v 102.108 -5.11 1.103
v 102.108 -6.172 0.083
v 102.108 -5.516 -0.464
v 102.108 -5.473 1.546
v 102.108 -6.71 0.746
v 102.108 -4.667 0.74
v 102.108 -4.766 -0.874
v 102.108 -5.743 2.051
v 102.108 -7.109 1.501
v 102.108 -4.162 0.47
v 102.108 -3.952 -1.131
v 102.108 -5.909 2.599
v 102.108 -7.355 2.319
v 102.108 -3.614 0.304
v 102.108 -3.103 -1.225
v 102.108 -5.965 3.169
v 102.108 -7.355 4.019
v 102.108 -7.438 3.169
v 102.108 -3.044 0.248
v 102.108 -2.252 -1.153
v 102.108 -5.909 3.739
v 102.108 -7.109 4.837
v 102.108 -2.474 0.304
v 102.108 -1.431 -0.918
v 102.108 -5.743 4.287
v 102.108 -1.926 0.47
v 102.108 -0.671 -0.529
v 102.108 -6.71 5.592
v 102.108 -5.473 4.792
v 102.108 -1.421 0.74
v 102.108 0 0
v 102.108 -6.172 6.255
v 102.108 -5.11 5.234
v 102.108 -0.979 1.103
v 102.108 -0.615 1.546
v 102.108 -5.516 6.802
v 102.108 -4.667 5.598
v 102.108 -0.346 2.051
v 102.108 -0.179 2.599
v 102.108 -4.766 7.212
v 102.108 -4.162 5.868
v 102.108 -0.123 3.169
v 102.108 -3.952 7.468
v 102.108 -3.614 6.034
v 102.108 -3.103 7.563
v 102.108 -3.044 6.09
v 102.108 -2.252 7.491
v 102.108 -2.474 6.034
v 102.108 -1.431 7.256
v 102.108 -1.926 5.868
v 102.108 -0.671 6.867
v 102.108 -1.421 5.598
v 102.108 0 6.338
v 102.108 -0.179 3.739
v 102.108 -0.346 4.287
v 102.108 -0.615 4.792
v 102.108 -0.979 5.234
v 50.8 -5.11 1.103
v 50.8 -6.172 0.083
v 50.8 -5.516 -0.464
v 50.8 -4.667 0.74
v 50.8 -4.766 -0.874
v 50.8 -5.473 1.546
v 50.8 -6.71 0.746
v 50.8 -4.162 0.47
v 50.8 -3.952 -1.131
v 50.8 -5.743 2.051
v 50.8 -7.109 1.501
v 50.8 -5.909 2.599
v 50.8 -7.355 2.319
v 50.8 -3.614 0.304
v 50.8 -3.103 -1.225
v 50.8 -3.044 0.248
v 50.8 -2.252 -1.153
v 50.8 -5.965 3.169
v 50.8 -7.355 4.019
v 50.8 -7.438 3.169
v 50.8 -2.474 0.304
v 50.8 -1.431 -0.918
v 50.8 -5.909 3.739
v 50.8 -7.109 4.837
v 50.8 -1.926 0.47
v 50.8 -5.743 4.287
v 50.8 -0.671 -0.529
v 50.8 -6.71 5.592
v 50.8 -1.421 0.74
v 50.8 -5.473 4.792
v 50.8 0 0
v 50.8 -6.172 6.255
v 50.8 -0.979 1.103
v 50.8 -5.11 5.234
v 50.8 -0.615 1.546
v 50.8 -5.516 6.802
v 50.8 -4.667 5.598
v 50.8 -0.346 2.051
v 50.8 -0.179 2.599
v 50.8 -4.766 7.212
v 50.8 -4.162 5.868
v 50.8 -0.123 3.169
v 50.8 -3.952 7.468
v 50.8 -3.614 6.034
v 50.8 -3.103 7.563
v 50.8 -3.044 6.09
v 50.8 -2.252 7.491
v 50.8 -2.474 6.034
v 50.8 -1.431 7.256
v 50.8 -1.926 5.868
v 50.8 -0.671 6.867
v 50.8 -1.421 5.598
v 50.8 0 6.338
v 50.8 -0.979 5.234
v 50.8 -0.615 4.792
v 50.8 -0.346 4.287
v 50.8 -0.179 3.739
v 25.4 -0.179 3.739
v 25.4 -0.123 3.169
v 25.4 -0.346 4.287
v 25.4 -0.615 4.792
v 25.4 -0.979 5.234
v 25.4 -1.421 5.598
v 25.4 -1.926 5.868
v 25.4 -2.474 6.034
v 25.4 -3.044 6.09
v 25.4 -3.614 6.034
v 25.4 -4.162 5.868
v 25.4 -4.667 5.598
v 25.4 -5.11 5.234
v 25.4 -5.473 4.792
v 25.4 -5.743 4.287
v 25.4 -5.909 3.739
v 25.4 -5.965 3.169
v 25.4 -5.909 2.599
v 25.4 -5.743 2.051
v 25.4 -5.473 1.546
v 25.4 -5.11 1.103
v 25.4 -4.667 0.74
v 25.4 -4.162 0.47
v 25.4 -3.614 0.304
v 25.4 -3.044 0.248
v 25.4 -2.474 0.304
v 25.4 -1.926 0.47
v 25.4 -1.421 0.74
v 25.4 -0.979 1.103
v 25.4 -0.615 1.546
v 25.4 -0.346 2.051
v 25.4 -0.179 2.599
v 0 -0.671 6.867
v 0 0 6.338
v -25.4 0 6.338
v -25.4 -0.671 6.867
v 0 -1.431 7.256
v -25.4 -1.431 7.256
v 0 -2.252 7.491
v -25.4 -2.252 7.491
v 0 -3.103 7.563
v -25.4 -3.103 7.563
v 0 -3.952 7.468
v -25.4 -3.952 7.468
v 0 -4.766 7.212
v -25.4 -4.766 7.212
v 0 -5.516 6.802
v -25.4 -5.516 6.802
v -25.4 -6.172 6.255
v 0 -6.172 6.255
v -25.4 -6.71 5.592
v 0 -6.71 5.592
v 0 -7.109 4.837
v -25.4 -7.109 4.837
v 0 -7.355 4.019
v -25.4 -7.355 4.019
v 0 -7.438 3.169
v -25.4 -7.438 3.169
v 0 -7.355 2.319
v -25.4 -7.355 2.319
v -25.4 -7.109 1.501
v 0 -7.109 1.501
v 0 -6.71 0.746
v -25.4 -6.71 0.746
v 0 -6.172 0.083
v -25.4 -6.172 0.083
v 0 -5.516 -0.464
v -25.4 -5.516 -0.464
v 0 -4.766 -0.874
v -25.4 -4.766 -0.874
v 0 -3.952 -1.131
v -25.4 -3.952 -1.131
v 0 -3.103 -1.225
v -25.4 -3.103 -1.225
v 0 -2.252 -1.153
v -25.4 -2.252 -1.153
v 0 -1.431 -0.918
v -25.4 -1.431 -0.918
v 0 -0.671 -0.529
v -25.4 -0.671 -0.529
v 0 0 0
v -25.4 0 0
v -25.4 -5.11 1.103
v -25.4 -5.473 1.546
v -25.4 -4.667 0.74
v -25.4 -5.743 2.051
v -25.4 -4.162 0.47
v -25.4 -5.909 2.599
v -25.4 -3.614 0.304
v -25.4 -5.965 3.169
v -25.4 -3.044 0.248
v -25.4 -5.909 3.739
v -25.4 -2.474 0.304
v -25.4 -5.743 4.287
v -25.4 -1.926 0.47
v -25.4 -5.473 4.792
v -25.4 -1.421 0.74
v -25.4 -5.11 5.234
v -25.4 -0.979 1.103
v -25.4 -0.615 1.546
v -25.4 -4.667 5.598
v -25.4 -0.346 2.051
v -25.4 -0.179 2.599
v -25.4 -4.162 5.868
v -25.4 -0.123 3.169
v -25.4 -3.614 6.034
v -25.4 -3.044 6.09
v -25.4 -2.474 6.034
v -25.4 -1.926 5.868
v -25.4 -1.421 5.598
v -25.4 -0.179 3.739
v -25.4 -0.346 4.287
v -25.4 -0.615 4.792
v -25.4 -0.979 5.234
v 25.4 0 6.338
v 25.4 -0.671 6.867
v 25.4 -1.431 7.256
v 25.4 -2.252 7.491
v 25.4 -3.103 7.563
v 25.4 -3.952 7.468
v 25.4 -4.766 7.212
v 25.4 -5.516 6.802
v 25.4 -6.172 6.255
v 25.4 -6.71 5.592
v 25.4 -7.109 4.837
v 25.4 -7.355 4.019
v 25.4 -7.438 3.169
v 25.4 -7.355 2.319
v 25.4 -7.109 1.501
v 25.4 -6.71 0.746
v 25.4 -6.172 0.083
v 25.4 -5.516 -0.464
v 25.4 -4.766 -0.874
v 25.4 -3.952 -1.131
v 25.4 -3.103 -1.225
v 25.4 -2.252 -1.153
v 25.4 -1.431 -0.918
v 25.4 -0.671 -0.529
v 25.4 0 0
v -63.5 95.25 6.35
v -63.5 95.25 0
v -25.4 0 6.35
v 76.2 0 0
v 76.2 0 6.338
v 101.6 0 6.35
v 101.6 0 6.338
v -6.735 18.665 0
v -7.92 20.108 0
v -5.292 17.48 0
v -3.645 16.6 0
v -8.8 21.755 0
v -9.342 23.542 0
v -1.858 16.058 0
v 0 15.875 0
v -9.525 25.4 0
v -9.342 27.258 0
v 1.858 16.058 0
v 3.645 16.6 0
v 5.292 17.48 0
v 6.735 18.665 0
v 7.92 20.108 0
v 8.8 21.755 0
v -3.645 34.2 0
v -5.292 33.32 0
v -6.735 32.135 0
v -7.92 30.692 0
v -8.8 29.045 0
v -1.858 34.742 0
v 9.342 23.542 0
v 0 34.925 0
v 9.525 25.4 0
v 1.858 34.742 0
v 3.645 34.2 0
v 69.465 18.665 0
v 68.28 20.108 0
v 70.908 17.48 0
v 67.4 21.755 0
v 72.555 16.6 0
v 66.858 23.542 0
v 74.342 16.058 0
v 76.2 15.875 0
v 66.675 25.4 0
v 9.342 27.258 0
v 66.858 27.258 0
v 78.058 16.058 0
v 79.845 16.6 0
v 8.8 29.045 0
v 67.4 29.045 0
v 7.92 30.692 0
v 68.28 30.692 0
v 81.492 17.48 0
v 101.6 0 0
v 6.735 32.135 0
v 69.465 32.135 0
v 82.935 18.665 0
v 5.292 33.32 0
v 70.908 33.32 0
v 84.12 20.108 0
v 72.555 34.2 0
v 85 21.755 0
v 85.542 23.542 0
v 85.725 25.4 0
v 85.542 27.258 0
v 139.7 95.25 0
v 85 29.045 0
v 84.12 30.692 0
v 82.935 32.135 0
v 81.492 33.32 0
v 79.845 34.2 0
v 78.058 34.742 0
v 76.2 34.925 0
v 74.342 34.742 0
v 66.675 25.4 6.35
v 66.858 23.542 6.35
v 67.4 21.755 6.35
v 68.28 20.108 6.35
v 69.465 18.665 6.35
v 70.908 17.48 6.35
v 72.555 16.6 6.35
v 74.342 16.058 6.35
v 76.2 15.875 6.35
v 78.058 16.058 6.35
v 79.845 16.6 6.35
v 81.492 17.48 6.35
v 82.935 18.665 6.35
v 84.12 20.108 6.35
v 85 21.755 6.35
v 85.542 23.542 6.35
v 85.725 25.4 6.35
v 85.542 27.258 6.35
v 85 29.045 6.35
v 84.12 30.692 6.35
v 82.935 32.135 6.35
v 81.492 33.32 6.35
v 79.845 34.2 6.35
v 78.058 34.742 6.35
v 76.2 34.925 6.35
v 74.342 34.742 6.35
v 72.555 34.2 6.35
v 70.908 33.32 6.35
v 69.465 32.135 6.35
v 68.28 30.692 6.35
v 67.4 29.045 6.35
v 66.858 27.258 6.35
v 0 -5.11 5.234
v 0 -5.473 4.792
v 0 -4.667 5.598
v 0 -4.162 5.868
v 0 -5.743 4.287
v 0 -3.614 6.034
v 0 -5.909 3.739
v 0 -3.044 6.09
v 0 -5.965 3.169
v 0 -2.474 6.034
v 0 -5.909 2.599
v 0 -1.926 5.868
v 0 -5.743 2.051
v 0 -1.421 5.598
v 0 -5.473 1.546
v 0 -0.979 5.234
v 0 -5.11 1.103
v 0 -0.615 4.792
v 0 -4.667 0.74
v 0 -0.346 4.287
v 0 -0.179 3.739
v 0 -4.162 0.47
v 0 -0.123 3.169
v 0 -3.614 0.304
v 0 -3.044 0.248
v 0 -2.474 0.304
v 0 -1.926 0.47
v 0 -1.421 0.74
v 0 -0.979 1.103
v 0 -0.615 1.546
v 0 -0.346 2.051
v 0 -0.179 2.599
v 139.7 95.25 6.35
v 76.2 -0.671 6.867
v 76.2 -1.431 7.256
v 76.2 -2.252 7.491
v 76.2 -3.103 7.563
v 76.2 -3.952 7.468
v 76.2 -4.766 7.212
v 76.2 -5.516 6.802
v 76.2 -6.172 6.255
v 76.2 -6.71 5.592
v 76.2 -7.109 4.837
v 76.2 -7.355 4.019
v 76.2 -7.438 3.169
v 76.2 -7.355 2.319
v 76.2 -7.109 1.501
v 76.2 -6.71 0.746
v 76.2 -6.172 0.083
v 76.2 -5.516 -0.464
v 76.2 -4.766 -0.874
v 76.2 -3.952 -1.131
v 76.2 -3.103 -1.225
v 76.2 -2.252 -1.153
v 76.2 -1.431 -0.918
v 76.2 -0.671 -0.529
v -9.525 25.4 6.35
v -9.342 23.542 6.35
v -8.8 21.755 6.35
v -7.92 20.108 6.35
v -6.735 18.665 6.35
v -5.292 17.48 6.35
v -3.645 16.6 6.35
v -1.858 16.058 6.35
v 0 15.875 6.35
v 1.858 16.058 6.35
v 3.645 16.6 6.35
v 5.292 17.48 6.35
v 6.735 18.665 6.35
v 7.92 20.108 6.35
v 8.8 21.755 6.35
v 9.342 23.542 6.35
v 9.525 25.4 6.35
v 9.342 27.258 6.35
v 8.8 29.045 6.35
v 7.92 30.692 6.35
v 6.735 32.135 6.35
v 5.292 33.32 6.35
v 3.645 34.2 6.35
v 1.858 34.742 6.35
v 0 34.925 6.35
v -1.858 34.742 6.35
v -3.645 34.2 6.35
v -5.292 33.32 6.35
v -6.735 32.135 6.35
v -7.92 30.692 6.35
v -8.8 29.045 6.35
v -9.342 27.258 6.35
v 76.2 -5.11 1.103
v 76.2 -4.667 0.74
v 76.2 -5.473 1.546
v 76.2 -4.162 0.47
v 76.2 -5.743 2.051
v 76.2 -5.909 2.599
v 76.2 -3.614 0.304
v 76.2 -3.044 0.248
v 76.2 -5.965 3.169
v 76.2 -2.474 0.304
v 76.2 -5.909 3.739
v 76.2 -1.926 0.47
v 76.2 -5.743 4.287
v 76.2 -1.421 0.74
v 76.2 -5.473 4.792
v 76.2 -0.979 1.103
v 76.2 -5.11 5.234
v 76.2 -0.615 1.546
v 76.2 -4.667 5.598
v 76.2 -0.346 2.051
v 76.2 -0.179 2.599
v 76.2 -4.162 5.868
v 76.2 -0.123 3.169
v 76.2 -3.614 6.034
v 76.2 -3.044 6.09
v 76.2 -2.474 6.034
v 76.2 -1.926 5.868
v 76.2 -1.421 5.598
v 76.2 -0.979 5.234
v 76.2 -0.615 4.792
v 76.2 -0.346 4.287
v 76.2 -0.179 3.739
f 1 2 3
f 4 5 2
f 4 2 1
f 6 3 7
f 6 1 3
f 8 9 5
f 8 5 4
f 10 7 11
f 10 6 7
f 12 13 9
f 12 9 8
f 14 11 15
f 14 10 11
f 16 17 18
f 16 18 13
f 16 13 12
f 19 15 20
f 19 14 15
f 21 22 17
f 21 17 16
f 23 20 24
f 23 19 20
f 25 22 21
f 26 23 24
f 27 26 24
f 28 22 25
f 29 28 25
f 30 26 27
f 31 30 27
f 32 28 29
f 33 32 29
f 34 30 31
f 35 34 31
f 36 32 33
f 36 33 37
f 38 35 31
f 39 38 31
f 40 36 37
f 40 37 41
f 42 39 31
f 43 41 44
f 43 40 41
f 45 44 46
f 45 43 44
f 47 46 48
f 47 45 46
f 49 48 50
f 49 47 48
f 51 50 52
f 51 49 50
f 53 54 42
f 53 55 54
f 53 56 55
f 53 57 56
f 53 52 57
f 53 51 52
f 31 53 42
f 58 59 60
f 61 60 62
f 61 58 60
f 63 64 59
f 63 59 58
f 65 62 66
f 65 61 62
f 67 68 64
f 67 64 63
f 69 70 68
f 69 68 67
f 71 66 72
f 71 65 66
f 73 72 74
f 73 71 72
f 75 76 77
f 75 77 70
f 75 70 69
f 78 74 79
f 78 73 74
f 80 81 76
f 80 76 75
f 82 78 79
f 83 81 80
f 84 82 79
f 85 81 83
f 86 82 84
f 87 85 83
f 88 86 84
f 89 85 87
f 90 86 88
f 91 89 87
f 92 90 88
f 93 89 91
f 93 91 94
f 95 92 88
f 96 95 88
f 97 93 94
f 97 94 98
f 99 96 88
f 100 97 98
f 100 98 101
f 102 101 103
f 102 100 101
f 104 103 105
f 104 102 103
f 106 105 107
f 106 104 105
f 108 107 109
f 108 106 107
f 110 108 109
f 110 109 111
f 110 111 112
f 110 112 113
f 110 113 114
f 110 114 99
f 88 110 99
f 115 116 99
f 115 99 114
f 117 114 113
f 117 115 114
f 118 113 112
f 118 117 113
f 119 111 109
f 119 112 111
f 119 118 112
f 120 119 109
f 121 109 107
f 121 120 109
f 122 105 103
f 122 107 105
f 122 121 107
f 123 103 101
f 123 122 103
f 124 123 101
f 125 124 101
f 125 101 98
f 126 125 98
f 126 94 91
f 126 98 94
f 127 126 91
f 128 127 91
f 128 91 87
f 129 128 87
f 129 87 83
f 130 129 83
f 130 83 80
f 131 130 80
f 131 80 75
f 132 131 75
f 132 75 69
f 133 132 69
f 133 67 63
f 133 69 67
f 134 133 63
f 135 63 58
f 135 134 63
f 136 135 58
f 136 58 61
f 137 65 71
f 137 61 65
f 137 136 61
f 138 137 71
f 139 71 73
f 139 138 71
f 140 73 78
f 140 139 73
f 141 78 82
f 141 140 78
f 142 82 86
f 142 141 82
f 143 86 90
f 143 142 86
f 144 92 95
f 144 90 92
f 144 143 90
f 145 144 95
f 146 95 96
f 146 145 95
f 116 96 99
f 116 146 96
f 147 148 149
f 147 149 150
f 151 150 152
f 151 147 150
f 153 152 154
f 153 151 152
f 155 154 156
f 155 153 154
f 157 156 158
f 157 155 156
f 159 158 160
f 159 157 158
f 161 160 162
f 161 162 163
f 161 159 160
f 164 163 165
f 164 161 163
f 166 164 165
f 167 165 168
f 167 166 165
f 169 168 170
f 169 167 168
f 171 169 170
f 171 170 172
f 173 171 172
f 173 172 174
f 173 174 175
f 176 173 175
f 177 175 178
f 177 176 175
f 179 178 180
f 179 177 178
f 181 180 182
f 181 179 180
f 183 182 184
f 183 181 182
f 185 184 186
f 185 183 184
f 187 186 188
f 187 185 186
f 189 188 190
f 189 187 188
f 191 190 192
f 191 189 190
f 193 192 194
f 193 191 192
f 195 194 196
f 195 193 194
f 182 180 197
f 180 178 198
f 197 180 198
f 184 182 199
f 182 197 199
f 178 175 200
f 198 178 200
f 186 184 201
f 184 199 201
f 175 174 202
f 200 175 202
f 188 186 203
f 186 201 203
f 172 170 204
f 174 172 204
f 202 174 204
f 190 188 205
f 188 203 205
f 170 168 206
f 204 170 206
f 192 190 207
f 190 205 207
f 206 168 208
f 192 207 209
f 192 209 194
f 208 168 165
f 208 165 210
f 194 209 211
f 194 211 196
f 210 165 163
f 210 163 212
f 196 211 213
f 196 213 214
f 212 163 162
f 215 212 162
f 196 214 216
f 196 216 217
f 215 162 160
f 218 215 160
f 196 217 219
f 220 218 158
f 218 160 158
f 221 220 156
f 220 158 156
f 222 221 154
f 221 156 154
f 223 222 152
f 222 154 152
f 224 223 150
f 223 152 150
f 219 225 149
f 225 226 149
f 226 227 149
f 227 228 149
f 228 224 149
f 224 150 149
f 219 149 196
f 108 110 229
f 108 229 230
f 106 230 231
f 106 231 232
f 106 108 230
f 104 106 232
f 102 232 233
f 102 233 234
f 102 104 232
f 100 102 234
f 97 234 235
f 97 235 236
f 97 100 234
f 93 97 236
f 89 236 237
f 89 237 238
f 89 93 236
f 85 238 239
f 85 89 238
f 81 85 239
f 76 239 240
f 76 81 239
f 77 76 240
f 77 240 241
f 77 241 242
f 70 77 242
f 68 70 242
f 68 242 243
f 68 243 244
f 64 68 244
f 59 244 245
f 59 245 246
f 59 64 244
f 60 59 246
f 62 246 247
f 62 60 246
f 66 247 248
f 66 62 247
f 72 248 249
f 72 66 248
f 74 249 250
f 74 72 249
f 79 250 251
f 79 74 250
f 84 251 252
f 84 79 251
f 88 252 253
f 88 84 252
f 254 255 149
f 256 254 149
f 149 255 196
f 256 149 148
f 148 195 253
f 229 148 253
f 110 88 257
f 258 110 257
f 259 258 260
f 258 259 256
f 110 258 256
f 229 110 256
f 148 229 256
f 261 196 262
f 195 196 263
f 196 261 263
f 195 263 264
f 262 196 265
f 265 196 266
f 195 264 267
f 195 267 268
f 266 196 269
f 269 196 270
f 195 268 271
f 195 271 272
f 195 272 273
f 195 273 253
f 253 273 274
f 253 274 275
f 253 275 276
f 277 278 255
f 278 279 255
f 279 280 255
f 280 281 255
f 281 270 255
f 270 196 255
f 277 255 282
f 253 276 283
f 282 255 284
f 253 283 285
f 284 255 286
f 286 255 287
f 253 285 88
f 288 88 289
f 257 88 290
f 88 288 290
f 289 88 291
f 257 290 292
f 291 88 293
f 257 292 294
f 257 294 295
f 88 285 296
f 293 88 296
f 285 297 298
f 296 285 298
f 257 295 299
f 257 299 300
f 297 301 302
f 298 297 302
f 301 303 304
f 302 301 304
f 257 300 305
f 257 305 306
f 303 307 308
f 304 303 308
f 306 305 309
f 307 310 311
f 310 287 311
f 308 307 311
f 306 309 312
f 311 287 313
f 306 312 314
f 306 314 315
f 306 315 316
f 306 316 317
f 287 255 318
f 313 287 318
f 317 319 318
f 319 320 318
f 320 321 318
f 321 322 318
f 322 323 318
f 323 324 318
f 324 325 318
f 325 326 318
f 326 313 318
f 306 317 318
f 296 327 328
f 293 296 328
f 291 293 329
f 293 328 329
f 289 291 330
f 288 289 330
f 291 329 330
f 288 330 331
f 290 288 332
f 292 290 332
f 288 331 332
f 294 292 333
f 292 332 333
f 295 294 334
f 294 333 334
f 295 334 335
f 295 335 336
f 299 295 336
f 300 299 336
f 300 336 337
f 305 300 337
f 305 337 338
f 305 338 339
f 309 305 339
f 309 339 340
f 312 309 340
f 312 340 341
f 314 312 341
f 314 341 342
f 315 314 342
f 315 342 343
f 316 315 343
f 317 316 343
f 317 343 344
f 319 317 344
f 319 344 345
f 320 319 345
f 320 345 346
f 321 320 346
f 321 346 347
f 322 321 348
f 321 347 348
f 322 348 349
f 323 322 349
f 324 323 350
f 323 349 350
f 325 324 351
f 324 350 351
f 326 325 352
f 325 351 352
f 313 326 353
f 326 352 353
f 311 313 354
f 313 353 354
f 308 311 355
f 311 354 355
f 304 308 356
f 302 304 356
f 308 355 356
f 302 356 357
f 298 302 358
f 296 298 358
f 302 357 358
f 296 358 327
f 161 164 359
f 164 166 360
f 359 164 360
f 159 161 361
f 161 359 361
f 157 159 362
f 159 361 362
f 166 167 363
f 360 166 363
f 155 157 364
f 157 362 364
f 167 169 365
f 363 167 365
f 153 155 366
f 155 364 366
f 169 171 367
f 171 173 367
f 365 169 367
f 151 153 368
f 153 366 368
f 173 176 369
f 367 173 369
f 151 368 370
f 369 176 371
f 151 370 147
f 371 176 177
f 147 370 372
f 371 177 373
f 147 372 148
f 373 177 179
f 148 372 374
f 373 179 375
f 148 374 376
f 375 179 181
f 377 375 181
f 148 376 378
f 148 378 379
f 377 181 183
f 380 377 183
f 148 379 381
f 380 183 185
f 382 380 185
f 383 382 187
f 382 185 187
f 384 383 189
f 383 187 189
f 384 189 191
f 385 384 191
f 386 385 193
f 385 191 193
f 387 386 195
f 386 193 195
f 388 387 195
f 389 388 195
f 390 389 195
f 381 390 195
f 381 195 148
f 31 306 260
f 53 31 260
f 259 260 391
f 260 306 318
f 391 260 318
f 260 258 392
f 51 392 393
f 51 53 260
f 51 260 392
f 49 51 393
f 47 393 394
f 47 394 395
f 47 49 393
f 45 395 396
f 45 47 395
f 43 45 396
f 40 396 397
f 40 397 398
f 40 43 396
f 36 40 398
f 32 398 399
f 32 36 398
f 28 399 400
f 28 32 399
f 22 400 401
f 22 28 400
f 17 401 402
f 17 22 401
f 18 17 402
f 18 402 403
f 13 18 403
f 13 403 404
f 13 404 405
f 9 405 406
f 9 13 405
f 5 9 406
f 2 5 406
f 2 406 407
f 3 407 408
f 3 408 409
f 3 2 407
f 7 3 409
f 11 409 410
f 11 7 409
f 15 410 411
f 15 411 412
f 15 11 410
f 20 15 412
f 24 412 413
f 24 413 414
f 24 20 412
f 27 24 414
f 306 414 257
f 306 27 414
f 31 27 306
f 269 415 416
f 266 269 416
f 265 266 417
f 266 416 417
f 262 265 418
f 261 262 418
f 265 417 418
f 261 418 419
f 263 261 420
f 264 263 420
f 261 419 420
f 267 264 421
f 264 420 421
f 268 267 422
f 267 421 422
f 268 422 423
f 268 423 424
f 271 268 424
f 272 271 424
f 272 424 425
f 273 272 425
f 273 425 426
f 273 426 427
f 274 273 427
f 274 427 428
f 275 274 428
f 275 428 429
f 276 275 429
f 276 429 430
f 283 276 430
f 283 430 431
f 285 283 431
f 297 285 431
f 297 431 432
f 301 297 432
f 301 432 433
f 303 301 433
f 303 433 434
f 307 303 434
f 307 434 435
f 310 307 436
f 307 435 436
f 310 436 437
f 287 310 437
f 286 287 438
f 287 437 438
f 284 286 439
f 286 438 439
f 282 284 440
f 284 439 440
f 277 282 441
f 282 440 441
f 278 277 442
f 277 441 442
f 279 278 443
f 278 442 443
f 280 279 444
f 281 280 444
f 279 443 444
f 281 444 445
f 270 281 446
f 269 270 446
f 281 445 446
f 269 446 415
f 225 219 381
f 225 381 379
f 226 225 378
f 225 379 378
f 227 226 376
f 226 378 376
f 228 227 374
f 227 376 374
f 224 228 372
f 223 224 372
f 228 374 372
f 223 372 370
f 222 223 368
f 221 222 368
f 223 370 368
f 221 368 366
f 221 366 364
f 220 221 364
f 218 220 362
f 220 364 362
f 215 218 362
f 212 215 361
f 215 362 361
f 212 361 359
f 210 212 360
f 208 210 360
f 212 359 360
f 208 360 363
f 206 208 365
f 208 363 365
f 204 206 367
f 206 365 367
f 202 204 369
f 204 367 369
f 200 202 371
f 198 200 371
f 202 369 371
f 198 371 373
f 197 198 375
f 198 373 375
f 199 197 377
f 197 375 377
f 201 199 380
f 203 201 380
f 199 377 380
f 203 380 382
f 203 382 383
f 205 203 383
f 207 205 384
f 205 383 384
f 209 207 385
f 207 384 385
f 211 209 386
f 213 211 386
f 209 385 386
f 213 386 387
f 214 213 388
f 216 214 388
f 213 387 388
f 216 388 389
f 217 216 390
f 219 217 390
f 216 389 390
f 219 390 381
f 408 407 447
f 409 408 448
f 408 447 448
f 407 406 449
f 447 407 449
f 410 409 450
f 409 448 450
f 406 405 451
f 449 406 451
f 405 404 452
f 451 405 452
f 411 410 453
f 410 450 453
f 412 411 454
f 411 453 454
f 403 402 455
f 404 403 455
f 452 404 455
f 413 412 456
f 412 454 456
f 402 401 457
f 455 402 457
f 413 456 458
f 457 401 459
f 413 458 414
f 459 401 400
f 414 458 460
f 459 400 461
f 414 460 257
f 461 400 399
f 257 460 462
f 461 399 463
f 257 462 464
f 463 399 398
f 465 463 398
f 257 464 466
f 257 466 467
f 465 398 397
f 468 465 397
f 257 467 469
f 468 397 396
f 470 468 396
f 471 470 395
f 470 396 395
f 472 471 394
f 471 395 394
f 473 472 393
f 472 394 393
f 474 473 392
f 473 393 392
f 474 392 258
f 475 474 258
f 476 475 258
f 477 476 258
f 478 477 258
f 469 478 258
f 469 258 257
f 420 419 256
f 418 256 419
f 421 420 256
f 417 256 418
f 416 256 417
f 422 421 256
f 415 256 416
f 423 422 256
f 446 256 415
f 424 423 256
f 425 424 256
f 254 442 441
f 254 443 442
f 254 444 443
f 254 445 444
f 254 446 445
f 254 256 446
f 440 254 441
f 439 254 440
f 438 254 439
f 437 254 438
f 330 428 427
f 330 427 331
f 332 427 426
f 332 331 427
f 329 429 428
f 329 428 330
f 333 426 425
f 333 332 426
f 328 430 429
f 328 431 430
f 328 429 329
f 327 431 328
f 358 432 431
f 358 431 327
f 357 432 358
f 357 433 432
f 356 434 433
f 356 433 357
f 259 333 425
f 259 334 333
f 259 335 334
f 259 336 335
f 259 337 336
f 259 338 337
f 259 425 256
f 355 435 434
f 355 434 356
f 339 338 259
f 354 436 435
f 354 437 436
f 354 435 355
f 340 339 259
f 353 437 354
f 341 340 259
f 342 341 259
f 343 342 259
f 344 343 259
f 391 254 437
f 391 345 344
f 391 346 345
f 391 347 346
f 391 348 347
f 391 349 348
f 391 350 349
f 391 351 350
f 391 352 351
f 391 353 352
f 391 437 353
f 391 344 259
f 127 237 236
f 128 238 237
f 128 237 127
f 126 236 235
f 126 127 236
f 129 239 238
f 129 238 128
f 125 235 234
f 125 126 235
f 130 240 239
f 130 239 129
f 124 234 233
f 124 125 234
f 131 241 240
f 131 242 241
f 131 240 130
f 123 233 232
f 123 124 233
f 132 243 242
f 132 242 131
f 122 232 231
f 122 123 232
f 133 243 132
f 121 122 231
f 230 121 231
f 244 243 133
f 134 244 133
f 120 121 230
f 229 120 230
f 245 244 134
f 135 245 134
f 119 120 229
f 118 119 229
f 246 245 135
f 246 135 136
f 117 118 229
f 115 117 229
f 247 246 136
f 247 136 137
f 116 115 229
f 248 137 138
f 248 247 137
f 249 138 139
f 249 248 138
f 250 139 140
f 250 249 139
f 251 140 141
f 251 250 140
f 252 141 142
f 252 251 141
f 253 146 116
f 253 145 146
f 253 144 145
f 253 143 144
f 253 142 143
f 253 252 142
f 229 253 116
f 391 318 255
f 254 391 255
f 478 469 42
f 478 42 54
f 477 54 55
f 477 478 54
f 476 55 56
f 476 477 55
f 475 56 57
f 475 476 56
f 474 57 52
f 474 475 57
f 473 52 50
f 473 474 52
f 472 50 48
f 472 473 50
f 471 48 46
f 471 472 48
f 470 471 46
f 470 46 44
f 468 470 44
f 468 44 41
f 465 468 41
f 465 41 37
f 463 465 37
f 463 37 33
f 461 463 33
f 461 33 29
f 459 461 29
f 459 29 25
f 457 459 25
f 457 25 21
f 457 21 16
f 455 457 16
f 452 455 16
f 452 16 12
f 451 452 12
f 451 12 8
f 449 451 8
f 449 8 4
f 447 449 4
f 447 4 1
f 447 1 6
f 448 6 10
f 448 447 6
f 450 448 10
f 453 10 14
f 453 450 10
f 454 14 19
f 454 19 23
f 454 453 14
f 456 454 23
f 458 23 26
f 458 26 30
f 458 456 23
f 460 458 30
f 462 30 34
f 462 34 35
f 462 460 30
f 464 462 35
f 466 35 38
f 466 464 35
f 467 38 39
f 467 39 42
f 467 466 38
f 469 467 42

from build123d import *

# Parameters (mm, degrees)
F1_DEPTH      = 6.35
F2_R          = 2.921
F3_DEPTH      = 102.108
F3_DEPTH_BACK = 25.4
F6_D          = 19.05
F7_W          = 25.4
F7_H          = 8.6004827172
F7_H_2        = 11.8143679574
F8_DEPTH      = 12.7


# Not quite as in the source:
# - a feature names something its author has since deleted; it is built from what else it names


with BuildPart() as f1:
    # F0 (on Top) → F1 (new body)
    with BuildSketch(Plane.XY):
        Polygon((139.7, 95.25), (-63.5, 95.25), (-25.4, 0), (101.6, 0), align=None)
    extrude(amount=F1_DEPTH)

    # F2 (on Right) → F3 (join, two sides)
    with BuildSketch(Plane.YZ) as f3_sk:
        with BuildLine():
            Line((0, 0), (0, 6.337816827))
            ThreePointArc((0, 6.337816827), (-7.4383769178, 3.1689084135), (0, 0))
        make_face()
        with Locations((-3.0441769178, 3.1689084135)):
            Circle(F2_R, mode=Mode.SUBTRACT)
    extrude(amount=F3_DEPTH)
    extrude(f3_sk.sketch, amount=-F3_DEPTH_BACK)

    # F6 (through all)
    with Locations(Plane(origin=(0, 0, 0), x_dir=(1, 0, 0), z_dir=(0, 0, -1))):
        with Locations((0, -25.400012026), (76.2, -25.400012026)):
            Hole(F6_D / 2)

    # F7 (on face) → F8 (cut, symmetric)
    with BuildSketch(Plane.XY.offset(6.35)):
        with Locations((12.7, -4.3002413586)):
            Rectangle(F7_W, F7_H)
        with Locations((63.5, -5.9071839787)):
            Rectangle(F7_W, F7_H_2)
    extrude(amount=F8_DEPTH, both=True, mode=Mode.SUBTRACT)


solid = f1.part
